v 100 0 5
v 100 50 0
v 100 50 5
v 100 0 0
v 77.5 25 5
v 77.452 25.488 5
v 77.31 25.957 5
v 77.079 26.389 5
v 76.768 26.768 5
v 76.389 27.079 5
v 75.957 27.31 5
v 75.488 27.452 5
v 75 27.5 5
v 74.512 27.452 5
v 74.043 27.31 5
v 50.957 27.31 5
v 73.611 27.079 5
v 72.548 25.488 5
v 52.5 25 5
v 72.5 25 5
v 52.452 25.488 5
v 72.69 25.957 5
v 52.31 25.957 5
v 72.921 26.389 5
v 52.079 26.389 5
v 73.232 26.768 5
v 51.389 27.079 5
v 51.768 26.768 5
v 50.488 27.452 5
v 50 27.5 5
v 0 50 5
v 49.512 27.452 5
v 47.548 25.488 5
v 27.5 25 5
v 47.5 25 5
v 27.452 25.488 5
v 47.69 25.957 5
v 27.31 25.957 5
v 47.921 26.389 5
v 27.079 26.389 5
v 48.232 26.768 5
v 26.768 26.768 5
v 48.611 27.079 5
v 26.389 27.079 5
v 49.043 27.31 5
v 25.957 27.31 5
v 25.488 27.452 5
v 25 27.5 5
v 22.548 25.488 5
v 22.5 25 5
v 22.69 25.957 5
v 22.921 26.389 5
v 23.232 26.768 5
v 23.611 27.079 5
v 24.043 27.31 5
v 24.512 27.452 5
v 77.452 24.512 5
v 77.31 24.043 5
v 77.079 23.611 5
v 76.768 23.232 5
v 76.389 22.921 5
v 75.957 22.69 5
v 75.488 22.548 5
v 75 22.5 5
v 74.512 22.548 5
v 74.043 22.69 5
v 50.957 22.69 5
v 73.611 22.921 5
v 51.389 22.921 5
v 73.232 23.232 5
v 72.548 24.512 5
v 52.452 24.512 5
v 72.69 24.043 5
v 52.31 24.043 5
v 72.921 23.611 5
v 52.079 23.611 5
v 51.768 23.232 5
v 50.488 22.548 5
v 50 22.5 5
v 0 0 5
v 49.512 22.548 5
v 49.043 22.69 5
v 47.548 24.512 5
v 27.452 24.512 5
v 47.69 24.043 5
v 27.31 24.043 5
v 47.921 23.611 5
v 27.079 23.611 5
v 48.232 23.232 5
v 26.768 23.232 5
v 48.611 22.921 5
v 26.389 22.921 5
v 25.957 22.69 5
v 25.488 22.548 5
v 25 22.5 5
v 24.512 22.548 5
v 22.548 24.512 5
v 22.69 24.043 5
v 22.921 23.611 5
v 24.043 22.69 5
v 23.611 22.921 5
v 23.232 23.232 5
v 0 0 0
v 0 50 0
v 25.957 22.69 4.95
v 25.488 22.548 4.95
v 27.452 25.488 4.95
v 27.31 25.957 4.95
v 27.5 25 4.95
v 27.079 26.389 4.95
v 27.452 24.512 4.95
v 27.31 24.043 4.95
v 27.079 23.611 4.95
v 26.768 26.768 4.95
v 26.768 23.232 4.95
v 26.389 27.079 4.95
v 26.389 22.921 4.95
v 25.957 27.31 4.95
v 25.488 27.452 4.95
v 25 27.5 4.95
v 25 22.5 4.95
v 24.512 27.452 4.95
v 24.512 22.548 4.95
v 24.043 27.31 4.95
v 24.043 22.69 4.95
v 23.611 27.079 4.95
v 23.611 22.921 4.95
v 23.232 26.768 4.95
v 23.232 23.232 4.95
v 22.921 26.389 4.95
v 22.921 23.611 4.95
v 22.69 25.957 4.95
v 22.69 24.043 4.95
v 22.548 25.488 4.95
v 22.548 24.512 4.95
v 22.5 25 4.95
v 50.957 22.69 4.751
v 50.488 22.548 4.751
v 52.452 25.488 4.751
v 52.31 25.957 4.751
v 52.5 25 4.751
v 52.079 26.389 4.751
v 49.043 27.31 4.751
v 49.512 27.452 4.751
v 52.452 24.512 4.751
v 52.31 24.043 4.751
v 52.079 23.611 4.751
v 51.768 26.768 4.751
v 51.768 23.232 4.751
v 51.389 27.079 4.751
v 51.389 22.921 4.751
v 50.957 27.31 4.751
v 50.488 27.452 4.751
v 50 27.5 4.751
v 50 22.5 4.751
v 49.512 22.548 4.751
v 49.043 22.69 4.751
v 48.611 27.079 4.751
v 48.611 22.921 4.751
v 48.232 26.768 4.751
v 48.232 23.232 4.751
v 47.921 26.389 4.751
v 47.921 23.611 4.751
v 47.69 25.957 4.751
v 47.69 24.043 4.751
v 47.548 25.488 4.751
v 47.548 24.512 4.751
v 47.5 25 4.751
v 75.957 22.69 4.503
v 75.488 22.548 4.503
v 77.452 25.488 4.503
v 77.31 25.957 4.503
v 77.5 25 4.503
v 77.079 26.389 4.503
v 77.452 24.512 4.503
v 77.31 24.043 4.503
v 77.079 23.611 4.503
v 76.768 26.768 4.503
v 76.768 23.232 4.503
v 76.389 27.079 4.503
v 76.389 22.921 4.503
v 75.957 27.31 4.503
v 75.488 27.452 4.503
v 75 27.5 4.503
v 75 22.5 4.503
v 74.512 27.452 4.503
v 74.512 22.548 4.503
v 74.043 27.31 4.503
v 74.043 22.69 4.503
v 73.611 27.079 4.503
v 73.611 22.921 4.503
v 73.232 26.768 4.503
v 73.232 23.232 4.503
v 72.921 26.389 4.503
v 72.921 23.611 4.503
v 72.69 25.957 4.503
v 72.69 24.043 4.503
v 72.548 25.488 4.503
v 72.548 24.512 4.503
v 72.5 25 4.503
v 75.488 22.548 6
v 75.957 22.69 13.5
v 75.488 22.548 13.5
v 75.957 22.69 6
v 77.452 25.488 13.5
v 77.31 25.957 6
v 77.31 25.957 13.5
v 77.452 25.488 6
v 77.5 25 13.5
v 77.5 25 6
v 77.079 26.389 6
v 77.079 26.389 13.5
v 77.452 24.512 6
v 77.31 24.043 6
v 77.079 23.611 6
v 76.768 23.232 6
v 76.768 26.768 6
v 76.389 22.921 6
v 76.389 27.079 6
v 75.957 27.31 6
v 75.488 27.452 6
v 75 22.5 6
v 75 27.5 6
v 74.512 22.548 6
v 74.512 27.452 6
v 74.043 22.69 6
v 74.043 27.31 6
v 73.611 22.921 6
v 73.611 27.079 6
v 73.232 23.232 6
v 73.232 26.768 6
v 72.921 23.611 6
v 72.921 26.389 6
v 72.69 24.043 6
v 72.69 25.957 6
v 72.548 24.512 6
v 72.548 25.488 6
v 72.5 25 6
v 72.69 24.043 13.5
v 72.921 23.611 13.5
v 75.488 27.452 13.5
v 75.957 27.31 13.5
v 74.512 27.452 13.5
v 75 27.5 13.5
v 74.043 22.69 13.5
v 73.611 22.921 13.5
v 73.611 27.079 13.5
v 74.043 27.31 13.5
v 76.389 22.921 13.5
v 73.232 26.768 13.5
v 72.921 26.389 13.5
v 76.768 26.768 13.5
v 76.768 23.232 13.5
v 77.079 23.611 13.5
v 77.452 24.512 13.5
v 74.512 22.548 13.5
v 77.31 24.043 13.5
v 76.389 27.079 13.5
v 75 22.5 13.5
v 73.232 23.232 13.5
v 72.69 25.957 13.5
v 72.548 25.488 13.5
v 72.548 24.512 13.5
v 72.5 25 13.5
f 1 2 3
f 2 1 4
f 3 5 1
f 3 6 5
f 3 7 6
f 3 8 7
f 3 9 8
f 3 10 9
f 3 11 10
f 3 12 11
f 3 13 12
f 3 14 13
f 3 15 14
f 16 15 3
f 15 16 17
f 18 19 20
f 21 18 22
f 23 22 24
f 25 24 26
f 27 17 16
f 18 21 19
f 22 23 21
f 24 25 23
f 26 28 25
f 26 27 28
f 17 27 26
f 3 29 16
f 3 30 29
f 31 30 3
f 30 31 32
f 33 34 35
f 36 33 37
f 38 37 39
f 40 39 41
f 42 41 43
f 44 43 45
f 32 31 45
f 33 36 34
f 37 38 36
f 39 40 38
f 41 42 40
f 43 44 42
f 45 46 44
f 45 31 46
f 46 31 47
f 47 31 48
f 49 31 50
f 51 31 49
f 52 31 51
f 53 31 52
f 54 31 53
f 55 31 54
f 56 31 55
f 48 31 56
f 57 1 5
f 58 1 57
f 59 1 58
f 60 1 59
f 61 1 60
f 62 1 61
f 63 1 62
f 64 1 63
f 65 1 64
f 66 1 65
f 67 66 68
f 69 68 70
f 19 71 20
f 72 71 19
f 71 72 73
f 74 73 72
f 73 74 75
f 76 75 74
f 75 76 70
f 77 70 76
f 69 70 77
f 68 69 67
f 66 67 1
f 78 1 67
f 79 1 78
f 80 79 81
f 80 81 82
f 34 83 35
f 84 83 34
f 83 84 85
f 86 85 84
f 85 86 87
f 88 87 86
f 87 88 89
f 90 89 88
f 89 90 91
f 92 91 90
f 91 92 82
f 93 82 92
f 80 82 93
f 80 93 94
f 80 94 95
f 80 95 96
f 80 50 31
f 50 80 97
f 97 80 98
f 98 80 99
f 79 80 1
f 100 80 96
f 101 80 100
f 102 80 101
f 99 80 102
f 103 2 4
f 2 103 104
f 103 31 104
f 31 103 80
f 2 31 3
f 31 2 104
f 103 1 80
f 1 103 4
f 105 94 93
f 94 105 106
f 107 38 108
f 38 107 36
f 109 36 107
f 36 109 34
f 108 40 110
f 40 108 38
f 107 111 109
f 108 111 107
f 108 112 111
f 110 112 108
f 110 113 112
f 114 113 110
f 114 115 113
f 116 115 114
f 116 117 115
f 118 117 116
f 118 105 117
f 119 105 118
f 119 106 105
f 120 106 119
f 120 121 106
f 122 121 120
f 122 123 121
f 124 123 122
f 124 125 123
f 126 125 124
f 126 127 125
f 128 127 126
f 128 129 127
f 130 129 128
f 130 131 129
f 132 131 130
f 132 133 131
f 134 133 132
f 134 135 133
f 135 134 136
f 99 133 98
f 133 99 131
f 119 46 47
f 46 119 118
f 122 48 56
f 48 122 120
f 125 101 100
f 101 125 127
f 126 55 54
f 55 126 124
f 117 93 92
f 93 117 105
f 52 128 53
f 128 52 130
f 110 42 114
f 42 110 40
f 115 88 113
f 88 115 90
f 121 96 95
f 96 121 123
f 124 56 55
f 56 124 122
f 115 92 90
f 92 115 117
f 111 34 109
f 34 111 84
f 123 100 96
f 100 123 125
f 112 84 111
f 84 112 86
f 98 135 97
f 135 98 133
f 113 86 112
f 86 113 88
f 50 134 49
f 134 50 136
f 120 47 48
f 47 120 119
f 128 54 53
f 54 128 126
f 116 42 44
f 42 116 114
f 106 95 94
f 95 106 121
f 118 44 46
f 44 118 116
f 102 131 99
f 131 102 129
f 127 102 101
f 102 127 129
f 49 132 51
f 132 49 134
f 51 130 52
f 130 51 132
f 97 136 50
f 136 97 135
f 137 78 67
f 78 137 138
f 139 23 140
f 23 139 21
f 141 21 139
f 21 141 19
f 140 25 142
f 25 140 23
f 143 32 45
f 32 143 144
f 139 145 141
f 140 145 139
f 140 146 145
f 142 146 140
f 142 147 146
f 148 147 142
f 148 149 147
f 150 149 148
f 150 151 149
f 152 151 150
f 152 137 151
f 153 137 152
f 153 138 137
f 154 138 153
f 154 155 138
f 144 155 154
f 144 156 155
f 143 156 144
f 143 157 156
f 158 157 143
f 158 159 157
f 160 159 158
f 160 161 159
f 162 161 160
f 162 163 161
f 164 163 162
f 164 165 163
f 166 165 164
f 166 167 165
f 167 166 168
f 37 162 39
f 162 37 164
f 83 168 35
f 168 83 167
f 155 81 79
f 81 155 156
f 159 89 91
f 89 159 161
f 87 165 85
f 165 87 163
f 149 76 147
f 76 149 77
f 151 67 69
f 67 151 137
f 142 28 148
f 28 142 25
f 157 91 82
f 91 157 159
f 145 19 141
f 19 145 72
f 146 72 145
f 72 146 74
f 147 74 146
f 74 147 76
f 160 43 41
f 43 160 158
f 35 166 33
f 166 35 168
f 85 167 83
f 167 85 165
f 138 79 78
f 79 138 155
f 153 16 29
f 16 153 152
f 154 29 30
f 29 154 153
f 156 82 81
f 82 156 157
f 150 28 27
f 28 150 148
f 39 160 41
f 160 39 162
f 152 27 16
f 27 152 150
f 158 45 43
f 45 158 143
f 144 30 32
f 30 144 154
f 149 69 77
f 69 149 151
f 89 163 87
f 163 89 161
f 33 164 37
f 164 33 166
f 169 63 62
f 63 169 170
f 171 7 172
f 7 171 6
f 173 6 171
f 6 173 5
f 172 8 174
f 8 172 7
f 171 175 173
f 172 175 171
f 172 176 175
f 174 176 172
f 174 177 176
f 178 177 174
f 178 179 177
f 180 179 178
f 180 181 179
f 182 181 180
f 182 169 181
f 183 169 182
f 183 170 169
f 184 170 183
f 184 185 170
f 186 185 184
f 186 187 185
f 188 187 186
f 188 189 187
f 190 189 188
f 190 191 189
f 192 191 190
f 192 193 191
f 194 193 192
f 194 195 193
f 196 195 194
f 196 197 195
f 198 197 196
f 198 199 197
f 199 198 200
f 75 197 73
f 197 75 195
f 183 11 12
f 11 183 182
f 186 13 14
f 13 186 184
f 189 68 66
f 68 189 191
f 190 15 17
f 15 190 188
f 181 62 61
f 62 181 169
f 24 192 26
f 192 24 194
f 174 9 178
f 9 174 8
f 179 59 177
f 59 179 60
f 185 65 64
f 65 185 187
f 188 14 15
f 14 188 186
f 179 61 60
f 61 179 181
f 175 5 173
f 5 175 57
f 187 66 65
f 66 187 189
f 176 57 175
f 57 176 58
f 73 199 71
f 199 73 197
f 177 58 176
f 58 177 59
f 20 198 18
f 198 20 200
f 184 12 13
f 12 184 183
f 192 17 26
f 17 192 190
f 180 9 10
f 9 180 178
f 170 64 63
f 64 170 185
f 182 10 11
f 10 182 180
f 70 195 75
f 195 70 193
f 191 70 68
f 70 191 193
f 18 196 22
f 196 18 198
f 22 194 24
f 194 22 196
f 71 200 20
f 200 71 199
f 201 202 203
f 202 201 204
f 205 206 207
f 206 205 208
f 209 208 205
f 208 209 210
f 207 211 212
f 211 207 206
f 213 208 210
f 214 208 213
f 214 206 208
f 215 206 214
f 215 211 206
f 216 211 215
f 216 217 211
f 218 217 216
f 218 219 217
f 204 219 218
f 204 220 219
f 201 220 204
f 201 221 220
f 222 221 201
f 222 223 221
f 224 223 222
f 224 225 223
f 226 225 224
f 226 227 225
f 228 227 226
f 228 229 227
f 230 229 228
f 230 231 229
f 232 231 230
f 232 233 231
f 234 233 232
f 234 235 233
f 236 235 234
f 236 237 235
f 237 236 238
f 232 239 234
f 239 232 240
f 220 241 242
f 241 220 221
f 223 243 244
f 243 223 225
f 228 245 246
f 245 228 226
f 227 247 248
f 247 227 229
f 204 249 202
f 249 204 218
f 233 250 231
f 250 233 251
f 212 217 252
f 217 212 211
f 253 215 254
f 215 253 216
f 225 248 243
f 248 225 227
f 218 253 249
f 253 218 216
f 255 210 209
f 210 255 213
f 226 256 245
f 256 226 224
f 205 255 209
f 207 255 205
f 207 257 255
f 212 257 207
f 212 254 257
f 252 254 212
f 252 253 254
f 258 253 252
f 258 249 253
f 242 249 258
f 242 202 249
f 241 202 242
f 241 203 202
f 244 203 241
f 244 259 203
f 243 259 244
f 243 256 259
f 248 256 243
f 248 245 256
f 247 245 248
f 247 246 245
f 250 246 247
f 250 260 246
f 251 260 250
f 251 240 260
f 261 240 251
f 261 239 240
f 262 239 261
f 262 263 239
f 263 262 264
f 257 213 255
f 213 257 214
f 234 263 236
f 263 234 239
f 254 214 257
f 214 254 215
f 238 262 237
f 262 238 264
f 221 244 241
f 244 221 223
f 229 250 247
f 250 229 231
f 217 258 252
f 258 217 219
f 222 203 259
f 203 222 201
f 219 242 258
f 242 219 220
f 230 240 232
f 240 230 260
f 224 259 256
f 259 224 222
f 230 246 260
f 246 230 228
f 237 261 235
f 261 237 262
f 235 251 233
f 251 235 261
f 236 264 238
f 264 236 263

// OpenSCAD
// OpenSCAD код, сгенерированный Python-скриптом
// Моделируется 3 КРАТЕРА с разным количеством разрядов.
// Глубина каждого кратера ОСНОВАНА НА ФИЗИЧЕСКОМ РАСЧЕТЕ.
// Вычитаемые цилиндры немного удлинены для избежания Z-fighting.
// Все размеры УЖЕ МАСШТАБИРОВАНЫ для OpenSCAD с коэффициентом 1000.0.
$fn = 32; // Количество граней для цилиндров

// --- Определения модулей ---
module workpiece(dim_x, dim_y, dim_z) {
    color("lightgray")
    cube([dim_x, dim_y, dim_z], center = false);
}

module electrode_tool_shape(diameter, height) {
    color("darkred", 0.7)
    cylinder(h = height, d = diameter, center = false); 
}

// --- Основная сборка ---
difference() {
    workpiece(100.0, 50.0, 5.0);
    
        // Кратер 1 (физ. глубина SCAD: 0.0497)
        translate([25.0, 25.0, 4.950286531032317]) 
            cylinder(
                h = 0.29971346896768314, 
                d = 5.0,
                center = false 
            );
        // Кратер 2 (физ. глубина SCAD: 0.2486)
        translate([50.0, 25.0, 4.751432655161584]) 
            cylinder(
                h = 0.4985673448384157, 
                d = 5.0,
                center = false 
            );
        // Кратер 3 (физ. глубина SCAD: 0.4971)
        translate([75.0, 25.0, 4.502865310323169]) 
            cylinder(
                h = 0.7471346896768314, 
                d = 5.0,
                center = false 
            );
}

translate([75.0, 25.0, 6.0])
    electrode_tool_shape(diameter = 5.0, height = 7.5);

// --- Информация для отладки (в единицах SCAD, т.е. масштабированных) ---
// Фактический коэффициент масштабирования: 1000.0
// Заготовка (SCAD): X=100.0, Y=50.0, Z=5.0
// Электрод/Вырез (SCAD): диаметр=5.0
// --- Фактические (немасштабированные) расчетные значения (в метрах) ---
// delta_V за 1 разряд: 9.761216805833594e-14 м^3

// Кратер 1: 10000 разрядов, Физическая глубина (немасштаб.): 4.971346896768314e-05 м, Глубина в SCAD: 0.04971346896768314

// Кратер 2: 50000 разрядов, Физическая глубина (немасштаб.): 0.0002485673448384157 м, Глубина в SCAD: 0.2485673448384157

// Кратер 3: 100000 разрядов, Физическая глубина (немасштаб.): 0.0004971346896768314 м, Глубина в SCAD: 0.4971346896768314
